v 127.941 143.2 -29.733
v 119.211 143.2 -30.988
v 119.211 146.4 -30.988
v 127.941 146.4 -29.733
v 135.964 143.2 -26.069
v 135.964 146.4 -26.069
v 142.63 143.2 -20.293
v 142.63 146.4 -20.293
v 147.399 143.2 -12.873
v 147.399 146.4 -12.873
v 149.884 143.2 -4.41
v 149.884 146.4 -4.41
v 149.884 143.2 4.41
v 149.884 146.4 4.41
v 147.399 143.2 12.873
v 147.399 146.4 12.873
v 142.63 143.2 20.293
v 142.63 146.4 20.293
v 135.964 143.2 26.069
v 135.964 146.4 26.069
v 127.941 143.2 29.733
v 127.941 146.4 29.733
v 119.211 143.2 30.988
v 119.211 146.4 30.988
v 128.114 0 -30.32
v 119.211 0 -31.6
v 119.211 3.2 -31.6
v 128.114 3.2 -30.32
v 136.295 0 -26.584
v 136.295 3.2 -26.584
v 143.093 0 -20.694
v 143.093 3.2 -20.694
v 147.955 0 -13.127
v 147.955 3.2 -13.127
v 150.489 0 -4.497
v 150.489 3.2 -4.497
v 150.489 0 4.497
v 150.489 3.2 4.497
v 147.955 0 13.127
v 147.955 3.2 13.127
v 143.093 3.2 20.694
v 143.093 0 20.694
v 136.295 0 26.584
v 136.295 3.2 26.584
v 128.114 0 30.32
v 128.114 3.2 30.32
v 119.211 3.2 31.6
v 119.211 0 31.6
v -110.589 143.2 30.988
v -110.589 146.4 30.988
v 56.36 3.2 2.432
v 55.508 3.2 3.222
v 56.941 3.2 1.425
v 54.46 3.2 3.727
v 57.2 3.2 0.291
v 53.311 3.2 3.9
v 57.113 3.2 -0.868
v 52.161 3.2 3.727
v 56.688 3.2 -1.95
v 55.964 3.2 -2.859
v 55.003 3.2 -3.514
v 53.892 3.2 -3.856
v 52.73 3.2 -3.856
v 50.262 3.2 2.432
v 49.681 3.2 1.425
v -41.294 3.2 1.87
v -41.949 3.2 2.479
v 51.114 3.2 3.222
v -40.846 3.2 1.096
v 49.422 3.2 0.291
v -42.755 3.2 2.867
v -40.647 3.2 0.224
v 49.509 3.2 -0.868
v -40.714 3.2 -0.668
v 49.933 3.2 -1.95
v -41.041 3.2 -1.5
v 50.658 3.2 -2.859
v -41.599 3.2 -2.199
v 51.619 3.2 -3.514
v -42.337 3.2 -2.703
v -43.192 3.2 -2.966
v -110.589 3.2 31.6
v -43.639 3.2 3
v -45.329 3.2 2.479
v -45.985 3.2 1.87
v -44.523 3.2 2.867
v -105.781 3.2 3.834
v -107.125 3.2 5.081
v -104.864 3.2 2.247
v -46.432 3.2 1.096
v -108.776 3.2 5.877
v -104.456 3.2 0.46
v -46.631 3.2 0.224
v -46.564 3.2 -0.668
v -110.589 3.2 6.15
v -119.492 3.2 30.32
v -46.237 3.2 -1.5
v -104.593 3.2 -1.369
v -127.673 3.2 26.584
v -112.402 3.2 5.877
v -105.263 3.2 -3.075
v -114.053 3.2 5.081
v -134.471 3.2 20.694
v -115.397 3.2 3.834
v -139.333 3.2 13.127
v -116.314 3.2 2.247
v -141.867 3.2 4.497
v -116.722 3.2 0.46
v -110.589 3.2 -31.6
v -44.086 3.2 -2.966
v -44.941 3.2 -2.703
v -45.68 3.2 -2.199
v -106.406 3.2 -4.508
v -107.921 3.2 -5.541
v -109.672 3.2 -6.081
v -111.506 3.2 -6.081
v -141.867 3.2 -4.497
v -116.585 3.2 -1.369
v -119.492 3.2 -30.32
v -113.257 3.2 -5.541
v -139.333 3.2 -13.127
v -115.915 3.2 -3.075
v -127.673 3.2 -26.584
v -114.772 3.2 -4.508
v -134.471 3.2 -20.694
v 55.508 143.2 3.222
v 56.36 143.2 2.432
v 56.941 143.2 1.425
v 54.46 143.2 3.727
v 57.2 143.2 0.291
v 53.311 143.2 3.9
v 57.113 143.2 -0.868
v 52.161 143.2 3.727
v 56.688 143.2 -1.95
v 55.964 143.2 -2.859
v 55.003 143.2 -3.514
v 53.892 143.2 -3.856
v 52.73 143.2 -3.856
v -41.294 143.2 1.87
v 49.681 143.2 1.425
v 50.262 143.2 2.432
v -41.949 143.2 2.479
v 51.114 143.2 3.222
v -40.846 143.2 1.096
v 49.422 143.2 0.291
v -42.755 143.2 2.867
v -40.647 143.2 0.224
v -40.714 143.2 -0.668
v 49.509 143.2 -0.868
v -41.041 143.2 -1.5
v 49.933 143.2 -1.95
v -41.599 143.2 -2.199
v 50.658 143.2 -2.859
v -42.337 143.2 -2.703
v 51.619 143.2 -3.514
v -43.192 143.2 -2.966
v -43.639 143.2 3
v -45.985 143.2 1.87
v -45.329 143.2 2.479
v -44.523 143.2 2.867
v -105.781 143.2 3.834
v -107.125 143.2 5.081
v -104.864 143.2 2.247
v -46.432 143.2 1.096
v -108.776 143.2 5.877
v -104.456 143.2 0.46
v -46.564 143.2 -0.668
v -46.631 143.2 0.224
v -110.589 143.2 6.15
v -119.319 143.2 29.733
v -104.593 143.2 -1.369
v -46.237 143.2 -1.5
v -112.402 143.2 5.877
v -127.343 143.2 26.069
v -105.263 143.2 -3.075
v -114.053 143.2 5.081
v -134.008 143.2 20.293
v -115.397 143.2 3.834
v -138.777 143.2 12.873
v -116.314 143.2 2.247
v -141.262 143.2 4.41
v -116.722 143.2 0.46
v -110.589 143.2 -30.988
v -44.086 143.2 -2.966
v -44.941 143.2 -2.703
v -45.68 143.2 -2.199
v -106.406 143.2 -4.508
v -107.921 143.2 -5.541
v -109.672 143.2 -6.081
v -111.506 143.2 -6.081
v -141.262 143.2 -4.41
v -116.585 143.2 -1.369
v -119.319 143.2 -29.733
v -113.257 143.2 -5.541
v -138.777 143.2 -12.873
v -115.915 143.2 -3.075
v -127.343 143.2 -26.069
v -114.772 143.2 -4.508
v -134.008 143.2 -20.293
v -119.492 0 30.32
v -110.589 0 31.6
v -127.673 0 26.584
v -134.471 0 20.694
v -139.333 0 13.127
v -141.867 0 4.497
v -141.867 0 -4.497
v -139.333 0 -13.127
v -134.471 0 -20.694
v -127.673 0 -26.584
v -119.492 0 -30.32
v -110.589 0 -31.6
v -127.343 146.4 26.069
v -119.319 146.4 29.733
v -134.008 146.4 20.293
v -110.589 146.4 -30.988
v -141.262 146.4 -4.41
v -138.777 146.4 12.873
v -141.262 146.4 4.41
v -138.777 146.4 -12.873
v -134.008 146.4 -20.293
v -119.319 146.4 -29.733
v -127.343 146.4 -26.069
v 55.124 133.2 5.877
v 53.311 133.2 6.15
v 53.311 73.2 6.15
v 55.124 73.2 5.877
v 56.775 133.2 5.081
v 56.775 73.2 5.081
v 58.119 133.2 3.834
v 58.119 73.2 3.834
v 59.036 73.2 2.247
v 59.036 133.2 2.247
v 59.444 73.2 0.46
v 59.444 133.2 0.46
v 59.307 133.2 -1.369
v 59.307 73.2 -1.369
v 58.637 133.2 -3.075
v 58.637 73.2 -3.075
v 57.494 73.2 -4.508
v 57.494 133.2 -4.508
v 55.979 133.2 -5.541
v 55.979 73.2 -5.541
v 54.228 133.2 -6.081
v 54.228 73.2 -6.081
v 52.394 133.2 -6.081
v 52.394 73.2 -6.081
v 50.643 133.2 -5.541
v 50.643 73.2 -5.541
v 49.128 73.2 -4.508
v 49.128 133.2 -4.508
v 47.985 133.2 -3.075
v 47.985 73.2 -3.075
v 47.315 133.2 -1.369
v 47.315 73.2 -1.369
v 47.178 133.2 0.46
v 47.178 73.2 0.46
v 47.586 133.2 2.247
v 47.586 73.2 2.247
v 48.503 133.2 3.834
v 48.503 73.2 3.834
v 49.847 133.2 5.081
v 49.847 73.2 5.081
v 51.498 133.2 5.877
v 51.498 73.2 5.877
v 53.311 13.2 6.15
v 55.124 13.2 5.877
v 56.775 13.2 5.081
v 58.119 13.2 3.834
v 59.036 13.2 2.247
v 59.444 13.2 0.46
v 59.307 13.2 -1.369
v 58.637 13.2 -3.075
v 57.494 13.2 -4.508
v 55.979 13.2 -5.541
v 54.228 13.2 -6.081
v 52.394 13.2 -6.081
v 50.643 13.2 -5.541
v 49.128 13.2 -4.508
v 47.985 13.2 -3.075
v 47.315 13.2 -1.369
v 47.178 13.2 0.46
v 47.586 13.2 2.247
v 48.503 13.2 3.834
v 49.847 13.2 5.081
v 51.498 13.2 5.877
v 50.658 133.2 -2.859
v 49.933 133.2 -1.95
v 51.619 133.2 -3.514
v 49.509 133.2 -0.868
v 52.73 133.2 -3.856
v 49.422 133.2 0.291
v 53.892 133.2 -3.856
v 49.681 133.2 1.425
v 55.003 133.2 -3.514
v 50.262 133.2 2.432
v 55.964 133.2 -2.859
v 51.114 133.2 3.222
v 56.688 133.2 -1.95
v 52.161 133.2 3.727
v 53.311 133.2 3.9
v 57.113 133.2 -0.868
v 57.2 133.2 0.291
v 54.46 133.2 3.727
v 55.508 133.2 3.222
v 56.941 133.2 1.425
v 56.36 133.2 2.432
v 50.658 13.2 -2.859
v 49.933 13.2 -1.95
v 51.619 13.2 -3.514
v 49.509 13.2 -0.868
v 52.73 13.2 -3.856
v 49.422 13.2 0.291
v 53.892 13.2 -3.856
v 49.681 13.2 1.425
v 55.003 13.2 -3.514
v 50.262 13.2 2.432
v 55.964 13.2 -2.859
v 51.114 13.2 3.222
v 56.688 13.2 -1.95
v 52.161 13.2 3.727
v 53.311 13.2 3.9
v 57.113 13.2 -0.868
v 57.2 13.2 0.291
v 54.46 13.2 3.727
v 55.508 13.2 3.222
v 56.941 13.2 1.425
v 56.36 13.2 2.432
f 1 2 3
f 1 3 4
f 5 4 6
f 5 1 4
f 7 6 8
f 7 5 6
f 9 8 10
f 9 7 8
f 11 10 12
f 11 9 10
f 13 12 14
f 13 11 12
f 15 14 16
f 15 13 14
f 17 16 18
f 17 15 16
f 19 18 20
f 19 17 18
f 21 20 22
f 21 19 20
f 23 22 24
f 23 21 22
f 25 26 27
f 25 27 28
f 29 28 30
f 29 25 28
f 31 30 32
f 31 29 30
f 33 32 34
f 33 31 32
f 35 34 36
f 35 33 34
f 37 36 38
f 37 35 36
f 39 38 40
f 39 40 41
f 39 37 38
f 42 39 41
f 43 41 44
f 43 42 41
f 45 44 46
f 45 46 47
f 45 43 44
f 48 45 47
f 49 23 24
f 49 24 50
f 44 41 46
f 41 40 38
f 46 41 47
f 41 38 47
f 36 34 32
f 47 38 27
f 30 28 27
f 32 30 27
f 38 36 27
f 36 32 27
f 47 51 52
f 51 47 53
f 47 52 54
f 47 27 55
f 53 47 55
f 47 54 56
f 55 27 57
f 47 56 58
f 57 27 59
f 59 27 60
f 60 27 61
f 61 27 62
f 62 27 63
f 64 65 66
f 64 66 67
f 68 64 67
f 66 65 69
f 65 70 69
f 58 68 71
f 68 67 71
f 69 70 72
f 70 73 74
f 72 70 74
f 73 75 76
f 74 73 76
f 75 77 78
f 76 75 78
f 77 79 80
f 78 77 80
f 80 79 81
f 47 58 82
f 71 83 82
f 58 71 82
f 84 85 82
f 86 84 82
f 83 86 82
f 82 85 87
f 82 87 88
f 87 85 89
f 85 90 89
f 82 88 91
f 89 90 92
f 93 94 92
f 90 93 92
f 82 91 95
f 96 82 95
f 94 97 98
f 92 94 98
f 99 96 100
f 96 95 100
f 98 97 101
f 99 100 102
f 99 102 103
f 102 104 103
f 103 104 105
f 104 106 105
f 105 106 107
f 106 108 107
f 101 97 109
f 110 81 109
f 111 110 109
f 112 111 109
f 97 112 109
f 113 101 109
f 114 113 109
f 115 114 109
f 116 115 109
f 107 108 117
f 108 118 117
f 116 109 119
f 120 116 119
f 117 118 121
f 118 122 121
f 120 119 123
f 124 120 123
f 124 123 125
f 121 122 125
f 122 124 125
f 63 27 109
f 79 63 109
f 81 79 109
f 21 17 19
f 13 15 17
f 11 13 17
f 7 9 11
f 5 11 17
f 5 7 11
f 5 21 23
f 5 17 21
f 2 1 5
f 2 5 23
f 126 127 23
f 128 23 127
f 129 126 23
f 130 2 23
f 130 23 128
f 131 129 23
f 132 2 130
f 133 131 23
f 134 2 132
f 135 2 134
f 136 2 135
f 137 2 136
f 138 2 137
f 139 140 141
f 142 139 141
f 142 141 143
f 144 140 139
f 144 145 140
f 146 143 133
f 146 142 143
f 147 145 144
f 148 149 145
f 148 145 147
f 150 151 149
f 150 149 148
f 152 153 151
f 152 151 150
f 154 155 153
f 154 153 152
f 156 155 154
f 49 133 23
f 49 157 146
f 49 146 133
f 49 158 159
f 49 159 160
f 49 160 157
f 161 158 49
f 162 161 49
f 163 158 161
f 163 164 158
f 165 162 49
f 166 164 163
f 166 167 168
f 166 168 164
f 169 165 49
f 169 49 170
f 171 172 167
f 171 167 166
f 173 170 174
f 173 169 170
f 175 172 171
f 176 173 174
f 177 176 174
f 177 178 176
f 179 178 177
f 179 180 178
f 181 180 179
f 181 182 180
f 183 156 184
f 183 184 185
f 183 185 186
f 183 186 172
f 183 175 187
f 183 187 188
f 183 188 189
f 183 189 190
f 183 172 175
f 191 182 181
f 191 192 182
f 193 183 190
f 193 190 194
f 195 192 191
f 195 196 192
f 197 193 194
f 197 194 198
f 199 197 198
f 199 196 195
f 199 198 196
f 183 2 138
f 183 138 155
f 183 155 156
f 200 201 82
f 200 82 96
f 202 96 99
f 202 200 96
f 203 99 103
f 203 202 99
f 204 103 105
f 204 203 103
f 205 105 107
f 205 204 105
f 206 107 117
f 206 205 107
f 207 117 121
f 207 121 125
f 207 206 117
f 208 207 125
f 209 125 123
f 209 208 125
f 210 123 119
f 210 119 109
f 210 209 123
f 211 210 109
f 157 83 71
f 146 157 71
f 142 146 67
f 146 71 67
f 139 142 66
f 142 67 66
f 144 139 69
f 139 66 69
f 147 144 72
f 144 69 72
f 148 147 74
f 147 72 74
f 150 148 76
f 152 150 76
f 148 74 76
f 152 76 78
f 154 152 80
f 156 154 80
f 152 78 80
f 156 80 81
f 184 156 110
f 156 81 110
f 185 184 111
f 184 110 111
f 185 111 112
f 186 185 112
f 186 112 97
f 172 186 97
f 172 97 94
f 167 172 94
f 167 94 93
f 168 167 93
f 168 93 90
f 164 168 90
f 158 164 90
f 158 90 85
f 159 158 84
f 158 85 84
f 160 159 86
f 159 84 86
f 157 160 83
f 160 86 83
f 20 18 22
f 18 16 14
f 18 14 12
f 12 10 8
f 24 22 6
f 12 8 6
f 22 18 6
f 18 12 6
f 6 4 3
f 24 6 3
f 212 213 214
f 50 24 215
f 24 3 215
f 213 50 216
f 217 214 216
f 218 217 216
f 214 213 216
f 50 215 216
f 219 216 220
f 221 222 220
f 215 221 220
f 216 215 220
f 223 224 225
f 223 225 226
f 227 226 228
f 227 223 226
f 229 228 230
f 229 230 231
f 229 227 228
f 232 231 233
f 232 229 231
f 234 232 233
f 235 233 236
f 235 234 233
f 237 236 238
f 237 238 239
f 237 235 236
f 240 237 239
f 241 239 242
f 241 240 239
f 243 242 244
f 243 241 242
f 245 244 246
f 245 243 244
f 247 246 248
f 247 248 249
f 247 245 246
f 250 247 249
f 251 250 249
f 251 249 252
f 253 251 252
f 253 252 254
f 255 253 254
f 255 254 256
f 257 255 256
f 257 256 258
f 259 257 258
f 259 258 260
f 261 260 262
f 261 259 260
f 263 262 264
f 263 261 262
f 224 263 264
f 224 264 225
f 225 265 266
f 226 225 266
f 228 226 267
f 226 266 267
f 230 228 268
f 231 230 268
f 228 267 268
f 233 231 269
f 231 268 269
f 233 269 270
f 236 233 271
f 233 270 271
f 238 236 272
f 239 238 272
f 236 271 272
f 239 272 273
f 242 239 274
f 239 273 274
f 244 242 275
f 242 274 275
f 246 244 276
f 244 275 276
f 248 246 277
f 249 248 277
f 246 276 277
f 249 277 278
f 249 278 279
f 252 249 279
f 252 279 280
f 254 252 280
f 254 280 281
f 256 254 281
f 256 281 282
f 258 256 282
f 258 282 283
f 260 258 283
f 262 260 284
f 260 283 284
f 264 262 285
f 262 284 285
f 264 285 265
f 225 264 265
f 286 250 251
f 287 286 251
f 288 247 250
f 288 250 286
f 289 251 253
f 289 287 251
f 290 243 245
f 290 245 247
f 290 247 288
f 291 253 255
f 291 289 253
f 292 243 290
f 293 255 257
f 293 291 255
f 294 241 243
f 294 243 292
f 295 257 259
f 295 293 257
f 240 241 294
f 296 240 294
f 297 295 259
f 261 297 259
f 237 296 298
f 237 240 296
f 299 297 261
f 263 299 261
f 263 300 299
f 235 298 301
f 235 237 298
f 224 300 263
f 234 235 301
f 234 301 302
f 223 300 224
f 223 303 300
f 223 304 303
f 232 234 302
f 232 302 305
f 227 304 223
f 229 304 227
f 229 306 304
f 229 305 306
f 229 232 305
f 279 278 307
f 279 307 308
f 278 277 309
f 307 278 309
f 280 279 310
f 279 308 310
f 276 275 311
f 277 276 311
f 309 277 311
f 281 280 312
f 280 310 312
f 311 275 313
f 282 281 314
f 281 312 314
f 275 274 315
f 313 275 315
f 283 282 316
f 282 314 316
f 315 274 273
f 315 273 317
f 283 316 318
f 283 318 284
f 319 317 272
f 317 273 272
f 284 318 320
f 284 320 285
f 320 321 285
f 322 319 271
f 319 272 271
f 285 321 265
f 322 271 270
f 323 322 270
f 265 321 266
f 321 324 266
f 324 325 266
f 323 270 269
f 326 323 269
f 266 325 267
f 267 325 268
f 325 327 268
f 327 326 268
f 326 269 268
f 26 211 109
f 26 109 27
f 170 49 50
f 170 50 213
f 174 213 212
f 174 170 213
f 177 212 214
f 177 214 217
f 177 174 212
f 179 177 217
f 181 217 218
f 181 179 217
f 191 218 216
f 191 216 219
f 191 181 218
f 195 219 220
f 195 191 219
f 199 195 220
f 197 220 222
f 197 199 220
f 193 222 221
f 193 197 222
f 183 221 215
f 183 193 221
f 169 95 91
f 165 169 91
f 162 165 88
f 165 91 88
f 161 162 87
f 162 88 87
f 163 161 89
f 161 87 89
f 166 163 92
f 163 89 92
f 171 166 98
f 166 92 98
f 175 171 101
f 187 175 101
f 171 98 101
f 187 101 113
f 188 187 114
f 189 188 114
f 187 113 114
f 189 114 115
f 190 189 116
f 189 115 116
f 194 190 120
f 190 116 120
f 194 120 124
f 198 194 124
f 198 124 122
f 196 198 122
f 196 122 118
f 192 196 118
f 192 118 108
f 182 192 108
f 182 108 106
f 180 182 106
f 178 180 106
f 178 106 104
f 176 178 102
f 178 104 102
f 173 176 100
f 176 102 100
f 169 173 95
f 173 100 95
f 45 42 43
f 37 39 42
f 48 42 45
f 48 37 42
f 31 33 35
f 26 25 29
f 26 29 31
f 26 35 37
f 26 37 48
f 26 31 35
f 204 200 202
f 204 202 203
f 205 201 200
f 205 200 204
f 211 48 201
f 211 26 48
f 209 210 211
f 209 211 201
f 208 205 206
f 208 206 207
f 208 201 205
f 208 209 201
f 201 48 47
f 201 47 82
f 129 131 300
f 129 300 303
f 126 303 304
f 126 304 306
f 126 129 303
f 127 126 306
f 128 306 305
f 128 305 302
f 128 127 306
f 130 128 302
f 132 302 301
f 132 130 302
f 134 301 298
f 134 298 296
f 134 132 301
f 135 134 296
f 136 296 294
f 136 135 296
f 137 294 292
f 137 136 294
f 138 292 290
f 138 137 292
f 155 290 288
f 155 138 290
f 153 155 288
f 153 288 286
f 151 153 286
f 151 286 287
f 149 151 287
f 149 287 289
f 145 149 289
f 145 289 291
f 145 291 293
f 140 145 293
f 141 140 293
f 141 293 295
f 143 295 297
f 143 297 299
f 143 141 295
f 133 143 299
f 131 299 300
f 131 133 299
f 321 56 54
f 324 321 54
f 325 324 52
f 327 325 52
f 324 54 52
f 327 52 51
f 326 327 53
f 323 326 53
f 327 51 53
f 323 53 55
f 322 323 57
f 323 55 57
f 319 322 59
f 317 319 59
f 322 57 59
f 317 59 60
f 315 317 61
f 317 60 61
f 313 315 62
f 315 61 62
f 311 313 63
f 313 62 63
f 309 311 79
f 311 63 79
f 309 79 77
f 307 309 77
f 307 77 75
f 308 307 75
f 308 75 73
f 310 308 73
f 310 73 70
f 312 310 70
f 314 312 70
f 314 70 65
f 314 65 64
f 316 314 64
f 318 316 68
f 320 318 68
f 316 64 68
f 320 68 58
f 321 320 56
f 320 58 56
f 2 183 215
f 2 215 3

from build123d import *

# Parameters (mm, degrees)
BOSS_EXTRUDE1_DEPTH = 3.2
SKETCH8_R           = 6.15
BOSS_EXTRUDE5_DEPTH = 140
BOSS_EXTRUDE6_DEPTH = 3.2
SKETCH12_R          = 3
BOSS_EXTRUDE7_DEPTH = 140
SKETCH14_R          = 3.9
BOSS_EXTRUDE8_DEPTH = 10
SKETCH15_R          = 6.15
BOSS_EXTRUDE9_DEPTH = 60


with BuildPart() as part:
    # Sketch1 → Boss-Extrude1 (new body)
    with BuildSketch(Plane(origin=(0, 0, 0), x_dir=(1, 0, 0), z_dir=(0, 1, 0))):
        with BuildLine():
            Line((-110.589063221, 31.6), (119.210936779, 31.6))
            ThreePointArc((119.210936779, 31.6), (150.810936779, 0), (119.210936779, -31.6))
            Line((119.210936779, -31.6), (-110.589063221, -31.6))
            ThreePointArc((-110.589063221, -31.6), (-142.189063221, 0), (-110.589063221, 31.6))
        make_face()
    extrude(amount=BOSS_EXTRUDE1_DEPTH)

    # Sketch8 → Boss-Extrude5 (add)
    with BuildSketch(Plane(origin=(0, 3.2, 0), x_dir=(1, 0, 0), z_dir=(0, 1, 0))):
        with Locations(Location((-110.589063221, 0, 0), (0, 0, 270))):
            Circle(SKETCH8_R)
    extrude(amount=BOSS_EXTRUDE5_DEPTH)

    # Sketch11 → Boss-Extrude6 (add)
    with BuildSketch(Plane(origin=(0, 143.2, 0), x_dir=(1, 0, 0), z_dir=(0, 1, 0))):
        with BuildLine():
            Line((-110.589063221, 30.988193708), (119.210936779, 30.988193708))
            ThreePointArc((119.210936779, 30.988193708), (150.199130487, 0), (119.210936779, -30.988193708))
            Line((119.210936779, -30.988193708), (-110.589063221, -30.988193708))
            ThreePointArc((-110.589063221, -30.988193708), (-141.577256929, 0), (-110.589063221, 30.988193708))
        make_face()
    extrude(amount=BOSS_EXTRUDE6_DEPTH)

    # Sketch12 → Boss-Extrude7 (add)
    with BuildSketch(Plane(origin=(0, 3.2, 0), x_dir=(1, 0, 0), z_dir=(0, 1, 0))):
        with Locations(Location((-43.639063221, 0, 0), (0, 0, 270))):
            Circle(SKETCH12_R)
    extrude(amount=BOSS_EXTRUDE7_DEPTH)

    # Sketch14 → Boss-Extrude8 (add)
    with BuildSketch(Plane(origin=(0, 3.2, 0), x_dir=(1, 0, 0), z_dir=(0, 1, 0))):
        with Locations(Location((53.310936779, 0, 0), (0, 0, 270))):
            Circle(SKETCH14_R)
    boss_extrude8 = extrude(amount=BOSS_EXTRUDE8_DEPTH)

    # Sketch15 → Boss-Extrude9 (add)
    with BuildSketch(Plane(origin=(0, 13.2, 0), x_dir=(1, 0, 0), z_dir=(0, 1, 0))):
        with Locations(Location((53.310936779, 0, 0), (0, 0, 270))):
            Circle(SKETCH15_R)
    boss_extrude9 = extrude(amount=BOSS_EXTRUDE9_DEPTH)

    # Mirror7: Boss-Extrude8, Boss-Extrude9 across plane
    add(boss_extrude8.mirror(Plane.ZX.offset(73.2)))
    add(boss_extrude9.mirror(Plane.ZX.offset(73.2)))


solid = part.part
